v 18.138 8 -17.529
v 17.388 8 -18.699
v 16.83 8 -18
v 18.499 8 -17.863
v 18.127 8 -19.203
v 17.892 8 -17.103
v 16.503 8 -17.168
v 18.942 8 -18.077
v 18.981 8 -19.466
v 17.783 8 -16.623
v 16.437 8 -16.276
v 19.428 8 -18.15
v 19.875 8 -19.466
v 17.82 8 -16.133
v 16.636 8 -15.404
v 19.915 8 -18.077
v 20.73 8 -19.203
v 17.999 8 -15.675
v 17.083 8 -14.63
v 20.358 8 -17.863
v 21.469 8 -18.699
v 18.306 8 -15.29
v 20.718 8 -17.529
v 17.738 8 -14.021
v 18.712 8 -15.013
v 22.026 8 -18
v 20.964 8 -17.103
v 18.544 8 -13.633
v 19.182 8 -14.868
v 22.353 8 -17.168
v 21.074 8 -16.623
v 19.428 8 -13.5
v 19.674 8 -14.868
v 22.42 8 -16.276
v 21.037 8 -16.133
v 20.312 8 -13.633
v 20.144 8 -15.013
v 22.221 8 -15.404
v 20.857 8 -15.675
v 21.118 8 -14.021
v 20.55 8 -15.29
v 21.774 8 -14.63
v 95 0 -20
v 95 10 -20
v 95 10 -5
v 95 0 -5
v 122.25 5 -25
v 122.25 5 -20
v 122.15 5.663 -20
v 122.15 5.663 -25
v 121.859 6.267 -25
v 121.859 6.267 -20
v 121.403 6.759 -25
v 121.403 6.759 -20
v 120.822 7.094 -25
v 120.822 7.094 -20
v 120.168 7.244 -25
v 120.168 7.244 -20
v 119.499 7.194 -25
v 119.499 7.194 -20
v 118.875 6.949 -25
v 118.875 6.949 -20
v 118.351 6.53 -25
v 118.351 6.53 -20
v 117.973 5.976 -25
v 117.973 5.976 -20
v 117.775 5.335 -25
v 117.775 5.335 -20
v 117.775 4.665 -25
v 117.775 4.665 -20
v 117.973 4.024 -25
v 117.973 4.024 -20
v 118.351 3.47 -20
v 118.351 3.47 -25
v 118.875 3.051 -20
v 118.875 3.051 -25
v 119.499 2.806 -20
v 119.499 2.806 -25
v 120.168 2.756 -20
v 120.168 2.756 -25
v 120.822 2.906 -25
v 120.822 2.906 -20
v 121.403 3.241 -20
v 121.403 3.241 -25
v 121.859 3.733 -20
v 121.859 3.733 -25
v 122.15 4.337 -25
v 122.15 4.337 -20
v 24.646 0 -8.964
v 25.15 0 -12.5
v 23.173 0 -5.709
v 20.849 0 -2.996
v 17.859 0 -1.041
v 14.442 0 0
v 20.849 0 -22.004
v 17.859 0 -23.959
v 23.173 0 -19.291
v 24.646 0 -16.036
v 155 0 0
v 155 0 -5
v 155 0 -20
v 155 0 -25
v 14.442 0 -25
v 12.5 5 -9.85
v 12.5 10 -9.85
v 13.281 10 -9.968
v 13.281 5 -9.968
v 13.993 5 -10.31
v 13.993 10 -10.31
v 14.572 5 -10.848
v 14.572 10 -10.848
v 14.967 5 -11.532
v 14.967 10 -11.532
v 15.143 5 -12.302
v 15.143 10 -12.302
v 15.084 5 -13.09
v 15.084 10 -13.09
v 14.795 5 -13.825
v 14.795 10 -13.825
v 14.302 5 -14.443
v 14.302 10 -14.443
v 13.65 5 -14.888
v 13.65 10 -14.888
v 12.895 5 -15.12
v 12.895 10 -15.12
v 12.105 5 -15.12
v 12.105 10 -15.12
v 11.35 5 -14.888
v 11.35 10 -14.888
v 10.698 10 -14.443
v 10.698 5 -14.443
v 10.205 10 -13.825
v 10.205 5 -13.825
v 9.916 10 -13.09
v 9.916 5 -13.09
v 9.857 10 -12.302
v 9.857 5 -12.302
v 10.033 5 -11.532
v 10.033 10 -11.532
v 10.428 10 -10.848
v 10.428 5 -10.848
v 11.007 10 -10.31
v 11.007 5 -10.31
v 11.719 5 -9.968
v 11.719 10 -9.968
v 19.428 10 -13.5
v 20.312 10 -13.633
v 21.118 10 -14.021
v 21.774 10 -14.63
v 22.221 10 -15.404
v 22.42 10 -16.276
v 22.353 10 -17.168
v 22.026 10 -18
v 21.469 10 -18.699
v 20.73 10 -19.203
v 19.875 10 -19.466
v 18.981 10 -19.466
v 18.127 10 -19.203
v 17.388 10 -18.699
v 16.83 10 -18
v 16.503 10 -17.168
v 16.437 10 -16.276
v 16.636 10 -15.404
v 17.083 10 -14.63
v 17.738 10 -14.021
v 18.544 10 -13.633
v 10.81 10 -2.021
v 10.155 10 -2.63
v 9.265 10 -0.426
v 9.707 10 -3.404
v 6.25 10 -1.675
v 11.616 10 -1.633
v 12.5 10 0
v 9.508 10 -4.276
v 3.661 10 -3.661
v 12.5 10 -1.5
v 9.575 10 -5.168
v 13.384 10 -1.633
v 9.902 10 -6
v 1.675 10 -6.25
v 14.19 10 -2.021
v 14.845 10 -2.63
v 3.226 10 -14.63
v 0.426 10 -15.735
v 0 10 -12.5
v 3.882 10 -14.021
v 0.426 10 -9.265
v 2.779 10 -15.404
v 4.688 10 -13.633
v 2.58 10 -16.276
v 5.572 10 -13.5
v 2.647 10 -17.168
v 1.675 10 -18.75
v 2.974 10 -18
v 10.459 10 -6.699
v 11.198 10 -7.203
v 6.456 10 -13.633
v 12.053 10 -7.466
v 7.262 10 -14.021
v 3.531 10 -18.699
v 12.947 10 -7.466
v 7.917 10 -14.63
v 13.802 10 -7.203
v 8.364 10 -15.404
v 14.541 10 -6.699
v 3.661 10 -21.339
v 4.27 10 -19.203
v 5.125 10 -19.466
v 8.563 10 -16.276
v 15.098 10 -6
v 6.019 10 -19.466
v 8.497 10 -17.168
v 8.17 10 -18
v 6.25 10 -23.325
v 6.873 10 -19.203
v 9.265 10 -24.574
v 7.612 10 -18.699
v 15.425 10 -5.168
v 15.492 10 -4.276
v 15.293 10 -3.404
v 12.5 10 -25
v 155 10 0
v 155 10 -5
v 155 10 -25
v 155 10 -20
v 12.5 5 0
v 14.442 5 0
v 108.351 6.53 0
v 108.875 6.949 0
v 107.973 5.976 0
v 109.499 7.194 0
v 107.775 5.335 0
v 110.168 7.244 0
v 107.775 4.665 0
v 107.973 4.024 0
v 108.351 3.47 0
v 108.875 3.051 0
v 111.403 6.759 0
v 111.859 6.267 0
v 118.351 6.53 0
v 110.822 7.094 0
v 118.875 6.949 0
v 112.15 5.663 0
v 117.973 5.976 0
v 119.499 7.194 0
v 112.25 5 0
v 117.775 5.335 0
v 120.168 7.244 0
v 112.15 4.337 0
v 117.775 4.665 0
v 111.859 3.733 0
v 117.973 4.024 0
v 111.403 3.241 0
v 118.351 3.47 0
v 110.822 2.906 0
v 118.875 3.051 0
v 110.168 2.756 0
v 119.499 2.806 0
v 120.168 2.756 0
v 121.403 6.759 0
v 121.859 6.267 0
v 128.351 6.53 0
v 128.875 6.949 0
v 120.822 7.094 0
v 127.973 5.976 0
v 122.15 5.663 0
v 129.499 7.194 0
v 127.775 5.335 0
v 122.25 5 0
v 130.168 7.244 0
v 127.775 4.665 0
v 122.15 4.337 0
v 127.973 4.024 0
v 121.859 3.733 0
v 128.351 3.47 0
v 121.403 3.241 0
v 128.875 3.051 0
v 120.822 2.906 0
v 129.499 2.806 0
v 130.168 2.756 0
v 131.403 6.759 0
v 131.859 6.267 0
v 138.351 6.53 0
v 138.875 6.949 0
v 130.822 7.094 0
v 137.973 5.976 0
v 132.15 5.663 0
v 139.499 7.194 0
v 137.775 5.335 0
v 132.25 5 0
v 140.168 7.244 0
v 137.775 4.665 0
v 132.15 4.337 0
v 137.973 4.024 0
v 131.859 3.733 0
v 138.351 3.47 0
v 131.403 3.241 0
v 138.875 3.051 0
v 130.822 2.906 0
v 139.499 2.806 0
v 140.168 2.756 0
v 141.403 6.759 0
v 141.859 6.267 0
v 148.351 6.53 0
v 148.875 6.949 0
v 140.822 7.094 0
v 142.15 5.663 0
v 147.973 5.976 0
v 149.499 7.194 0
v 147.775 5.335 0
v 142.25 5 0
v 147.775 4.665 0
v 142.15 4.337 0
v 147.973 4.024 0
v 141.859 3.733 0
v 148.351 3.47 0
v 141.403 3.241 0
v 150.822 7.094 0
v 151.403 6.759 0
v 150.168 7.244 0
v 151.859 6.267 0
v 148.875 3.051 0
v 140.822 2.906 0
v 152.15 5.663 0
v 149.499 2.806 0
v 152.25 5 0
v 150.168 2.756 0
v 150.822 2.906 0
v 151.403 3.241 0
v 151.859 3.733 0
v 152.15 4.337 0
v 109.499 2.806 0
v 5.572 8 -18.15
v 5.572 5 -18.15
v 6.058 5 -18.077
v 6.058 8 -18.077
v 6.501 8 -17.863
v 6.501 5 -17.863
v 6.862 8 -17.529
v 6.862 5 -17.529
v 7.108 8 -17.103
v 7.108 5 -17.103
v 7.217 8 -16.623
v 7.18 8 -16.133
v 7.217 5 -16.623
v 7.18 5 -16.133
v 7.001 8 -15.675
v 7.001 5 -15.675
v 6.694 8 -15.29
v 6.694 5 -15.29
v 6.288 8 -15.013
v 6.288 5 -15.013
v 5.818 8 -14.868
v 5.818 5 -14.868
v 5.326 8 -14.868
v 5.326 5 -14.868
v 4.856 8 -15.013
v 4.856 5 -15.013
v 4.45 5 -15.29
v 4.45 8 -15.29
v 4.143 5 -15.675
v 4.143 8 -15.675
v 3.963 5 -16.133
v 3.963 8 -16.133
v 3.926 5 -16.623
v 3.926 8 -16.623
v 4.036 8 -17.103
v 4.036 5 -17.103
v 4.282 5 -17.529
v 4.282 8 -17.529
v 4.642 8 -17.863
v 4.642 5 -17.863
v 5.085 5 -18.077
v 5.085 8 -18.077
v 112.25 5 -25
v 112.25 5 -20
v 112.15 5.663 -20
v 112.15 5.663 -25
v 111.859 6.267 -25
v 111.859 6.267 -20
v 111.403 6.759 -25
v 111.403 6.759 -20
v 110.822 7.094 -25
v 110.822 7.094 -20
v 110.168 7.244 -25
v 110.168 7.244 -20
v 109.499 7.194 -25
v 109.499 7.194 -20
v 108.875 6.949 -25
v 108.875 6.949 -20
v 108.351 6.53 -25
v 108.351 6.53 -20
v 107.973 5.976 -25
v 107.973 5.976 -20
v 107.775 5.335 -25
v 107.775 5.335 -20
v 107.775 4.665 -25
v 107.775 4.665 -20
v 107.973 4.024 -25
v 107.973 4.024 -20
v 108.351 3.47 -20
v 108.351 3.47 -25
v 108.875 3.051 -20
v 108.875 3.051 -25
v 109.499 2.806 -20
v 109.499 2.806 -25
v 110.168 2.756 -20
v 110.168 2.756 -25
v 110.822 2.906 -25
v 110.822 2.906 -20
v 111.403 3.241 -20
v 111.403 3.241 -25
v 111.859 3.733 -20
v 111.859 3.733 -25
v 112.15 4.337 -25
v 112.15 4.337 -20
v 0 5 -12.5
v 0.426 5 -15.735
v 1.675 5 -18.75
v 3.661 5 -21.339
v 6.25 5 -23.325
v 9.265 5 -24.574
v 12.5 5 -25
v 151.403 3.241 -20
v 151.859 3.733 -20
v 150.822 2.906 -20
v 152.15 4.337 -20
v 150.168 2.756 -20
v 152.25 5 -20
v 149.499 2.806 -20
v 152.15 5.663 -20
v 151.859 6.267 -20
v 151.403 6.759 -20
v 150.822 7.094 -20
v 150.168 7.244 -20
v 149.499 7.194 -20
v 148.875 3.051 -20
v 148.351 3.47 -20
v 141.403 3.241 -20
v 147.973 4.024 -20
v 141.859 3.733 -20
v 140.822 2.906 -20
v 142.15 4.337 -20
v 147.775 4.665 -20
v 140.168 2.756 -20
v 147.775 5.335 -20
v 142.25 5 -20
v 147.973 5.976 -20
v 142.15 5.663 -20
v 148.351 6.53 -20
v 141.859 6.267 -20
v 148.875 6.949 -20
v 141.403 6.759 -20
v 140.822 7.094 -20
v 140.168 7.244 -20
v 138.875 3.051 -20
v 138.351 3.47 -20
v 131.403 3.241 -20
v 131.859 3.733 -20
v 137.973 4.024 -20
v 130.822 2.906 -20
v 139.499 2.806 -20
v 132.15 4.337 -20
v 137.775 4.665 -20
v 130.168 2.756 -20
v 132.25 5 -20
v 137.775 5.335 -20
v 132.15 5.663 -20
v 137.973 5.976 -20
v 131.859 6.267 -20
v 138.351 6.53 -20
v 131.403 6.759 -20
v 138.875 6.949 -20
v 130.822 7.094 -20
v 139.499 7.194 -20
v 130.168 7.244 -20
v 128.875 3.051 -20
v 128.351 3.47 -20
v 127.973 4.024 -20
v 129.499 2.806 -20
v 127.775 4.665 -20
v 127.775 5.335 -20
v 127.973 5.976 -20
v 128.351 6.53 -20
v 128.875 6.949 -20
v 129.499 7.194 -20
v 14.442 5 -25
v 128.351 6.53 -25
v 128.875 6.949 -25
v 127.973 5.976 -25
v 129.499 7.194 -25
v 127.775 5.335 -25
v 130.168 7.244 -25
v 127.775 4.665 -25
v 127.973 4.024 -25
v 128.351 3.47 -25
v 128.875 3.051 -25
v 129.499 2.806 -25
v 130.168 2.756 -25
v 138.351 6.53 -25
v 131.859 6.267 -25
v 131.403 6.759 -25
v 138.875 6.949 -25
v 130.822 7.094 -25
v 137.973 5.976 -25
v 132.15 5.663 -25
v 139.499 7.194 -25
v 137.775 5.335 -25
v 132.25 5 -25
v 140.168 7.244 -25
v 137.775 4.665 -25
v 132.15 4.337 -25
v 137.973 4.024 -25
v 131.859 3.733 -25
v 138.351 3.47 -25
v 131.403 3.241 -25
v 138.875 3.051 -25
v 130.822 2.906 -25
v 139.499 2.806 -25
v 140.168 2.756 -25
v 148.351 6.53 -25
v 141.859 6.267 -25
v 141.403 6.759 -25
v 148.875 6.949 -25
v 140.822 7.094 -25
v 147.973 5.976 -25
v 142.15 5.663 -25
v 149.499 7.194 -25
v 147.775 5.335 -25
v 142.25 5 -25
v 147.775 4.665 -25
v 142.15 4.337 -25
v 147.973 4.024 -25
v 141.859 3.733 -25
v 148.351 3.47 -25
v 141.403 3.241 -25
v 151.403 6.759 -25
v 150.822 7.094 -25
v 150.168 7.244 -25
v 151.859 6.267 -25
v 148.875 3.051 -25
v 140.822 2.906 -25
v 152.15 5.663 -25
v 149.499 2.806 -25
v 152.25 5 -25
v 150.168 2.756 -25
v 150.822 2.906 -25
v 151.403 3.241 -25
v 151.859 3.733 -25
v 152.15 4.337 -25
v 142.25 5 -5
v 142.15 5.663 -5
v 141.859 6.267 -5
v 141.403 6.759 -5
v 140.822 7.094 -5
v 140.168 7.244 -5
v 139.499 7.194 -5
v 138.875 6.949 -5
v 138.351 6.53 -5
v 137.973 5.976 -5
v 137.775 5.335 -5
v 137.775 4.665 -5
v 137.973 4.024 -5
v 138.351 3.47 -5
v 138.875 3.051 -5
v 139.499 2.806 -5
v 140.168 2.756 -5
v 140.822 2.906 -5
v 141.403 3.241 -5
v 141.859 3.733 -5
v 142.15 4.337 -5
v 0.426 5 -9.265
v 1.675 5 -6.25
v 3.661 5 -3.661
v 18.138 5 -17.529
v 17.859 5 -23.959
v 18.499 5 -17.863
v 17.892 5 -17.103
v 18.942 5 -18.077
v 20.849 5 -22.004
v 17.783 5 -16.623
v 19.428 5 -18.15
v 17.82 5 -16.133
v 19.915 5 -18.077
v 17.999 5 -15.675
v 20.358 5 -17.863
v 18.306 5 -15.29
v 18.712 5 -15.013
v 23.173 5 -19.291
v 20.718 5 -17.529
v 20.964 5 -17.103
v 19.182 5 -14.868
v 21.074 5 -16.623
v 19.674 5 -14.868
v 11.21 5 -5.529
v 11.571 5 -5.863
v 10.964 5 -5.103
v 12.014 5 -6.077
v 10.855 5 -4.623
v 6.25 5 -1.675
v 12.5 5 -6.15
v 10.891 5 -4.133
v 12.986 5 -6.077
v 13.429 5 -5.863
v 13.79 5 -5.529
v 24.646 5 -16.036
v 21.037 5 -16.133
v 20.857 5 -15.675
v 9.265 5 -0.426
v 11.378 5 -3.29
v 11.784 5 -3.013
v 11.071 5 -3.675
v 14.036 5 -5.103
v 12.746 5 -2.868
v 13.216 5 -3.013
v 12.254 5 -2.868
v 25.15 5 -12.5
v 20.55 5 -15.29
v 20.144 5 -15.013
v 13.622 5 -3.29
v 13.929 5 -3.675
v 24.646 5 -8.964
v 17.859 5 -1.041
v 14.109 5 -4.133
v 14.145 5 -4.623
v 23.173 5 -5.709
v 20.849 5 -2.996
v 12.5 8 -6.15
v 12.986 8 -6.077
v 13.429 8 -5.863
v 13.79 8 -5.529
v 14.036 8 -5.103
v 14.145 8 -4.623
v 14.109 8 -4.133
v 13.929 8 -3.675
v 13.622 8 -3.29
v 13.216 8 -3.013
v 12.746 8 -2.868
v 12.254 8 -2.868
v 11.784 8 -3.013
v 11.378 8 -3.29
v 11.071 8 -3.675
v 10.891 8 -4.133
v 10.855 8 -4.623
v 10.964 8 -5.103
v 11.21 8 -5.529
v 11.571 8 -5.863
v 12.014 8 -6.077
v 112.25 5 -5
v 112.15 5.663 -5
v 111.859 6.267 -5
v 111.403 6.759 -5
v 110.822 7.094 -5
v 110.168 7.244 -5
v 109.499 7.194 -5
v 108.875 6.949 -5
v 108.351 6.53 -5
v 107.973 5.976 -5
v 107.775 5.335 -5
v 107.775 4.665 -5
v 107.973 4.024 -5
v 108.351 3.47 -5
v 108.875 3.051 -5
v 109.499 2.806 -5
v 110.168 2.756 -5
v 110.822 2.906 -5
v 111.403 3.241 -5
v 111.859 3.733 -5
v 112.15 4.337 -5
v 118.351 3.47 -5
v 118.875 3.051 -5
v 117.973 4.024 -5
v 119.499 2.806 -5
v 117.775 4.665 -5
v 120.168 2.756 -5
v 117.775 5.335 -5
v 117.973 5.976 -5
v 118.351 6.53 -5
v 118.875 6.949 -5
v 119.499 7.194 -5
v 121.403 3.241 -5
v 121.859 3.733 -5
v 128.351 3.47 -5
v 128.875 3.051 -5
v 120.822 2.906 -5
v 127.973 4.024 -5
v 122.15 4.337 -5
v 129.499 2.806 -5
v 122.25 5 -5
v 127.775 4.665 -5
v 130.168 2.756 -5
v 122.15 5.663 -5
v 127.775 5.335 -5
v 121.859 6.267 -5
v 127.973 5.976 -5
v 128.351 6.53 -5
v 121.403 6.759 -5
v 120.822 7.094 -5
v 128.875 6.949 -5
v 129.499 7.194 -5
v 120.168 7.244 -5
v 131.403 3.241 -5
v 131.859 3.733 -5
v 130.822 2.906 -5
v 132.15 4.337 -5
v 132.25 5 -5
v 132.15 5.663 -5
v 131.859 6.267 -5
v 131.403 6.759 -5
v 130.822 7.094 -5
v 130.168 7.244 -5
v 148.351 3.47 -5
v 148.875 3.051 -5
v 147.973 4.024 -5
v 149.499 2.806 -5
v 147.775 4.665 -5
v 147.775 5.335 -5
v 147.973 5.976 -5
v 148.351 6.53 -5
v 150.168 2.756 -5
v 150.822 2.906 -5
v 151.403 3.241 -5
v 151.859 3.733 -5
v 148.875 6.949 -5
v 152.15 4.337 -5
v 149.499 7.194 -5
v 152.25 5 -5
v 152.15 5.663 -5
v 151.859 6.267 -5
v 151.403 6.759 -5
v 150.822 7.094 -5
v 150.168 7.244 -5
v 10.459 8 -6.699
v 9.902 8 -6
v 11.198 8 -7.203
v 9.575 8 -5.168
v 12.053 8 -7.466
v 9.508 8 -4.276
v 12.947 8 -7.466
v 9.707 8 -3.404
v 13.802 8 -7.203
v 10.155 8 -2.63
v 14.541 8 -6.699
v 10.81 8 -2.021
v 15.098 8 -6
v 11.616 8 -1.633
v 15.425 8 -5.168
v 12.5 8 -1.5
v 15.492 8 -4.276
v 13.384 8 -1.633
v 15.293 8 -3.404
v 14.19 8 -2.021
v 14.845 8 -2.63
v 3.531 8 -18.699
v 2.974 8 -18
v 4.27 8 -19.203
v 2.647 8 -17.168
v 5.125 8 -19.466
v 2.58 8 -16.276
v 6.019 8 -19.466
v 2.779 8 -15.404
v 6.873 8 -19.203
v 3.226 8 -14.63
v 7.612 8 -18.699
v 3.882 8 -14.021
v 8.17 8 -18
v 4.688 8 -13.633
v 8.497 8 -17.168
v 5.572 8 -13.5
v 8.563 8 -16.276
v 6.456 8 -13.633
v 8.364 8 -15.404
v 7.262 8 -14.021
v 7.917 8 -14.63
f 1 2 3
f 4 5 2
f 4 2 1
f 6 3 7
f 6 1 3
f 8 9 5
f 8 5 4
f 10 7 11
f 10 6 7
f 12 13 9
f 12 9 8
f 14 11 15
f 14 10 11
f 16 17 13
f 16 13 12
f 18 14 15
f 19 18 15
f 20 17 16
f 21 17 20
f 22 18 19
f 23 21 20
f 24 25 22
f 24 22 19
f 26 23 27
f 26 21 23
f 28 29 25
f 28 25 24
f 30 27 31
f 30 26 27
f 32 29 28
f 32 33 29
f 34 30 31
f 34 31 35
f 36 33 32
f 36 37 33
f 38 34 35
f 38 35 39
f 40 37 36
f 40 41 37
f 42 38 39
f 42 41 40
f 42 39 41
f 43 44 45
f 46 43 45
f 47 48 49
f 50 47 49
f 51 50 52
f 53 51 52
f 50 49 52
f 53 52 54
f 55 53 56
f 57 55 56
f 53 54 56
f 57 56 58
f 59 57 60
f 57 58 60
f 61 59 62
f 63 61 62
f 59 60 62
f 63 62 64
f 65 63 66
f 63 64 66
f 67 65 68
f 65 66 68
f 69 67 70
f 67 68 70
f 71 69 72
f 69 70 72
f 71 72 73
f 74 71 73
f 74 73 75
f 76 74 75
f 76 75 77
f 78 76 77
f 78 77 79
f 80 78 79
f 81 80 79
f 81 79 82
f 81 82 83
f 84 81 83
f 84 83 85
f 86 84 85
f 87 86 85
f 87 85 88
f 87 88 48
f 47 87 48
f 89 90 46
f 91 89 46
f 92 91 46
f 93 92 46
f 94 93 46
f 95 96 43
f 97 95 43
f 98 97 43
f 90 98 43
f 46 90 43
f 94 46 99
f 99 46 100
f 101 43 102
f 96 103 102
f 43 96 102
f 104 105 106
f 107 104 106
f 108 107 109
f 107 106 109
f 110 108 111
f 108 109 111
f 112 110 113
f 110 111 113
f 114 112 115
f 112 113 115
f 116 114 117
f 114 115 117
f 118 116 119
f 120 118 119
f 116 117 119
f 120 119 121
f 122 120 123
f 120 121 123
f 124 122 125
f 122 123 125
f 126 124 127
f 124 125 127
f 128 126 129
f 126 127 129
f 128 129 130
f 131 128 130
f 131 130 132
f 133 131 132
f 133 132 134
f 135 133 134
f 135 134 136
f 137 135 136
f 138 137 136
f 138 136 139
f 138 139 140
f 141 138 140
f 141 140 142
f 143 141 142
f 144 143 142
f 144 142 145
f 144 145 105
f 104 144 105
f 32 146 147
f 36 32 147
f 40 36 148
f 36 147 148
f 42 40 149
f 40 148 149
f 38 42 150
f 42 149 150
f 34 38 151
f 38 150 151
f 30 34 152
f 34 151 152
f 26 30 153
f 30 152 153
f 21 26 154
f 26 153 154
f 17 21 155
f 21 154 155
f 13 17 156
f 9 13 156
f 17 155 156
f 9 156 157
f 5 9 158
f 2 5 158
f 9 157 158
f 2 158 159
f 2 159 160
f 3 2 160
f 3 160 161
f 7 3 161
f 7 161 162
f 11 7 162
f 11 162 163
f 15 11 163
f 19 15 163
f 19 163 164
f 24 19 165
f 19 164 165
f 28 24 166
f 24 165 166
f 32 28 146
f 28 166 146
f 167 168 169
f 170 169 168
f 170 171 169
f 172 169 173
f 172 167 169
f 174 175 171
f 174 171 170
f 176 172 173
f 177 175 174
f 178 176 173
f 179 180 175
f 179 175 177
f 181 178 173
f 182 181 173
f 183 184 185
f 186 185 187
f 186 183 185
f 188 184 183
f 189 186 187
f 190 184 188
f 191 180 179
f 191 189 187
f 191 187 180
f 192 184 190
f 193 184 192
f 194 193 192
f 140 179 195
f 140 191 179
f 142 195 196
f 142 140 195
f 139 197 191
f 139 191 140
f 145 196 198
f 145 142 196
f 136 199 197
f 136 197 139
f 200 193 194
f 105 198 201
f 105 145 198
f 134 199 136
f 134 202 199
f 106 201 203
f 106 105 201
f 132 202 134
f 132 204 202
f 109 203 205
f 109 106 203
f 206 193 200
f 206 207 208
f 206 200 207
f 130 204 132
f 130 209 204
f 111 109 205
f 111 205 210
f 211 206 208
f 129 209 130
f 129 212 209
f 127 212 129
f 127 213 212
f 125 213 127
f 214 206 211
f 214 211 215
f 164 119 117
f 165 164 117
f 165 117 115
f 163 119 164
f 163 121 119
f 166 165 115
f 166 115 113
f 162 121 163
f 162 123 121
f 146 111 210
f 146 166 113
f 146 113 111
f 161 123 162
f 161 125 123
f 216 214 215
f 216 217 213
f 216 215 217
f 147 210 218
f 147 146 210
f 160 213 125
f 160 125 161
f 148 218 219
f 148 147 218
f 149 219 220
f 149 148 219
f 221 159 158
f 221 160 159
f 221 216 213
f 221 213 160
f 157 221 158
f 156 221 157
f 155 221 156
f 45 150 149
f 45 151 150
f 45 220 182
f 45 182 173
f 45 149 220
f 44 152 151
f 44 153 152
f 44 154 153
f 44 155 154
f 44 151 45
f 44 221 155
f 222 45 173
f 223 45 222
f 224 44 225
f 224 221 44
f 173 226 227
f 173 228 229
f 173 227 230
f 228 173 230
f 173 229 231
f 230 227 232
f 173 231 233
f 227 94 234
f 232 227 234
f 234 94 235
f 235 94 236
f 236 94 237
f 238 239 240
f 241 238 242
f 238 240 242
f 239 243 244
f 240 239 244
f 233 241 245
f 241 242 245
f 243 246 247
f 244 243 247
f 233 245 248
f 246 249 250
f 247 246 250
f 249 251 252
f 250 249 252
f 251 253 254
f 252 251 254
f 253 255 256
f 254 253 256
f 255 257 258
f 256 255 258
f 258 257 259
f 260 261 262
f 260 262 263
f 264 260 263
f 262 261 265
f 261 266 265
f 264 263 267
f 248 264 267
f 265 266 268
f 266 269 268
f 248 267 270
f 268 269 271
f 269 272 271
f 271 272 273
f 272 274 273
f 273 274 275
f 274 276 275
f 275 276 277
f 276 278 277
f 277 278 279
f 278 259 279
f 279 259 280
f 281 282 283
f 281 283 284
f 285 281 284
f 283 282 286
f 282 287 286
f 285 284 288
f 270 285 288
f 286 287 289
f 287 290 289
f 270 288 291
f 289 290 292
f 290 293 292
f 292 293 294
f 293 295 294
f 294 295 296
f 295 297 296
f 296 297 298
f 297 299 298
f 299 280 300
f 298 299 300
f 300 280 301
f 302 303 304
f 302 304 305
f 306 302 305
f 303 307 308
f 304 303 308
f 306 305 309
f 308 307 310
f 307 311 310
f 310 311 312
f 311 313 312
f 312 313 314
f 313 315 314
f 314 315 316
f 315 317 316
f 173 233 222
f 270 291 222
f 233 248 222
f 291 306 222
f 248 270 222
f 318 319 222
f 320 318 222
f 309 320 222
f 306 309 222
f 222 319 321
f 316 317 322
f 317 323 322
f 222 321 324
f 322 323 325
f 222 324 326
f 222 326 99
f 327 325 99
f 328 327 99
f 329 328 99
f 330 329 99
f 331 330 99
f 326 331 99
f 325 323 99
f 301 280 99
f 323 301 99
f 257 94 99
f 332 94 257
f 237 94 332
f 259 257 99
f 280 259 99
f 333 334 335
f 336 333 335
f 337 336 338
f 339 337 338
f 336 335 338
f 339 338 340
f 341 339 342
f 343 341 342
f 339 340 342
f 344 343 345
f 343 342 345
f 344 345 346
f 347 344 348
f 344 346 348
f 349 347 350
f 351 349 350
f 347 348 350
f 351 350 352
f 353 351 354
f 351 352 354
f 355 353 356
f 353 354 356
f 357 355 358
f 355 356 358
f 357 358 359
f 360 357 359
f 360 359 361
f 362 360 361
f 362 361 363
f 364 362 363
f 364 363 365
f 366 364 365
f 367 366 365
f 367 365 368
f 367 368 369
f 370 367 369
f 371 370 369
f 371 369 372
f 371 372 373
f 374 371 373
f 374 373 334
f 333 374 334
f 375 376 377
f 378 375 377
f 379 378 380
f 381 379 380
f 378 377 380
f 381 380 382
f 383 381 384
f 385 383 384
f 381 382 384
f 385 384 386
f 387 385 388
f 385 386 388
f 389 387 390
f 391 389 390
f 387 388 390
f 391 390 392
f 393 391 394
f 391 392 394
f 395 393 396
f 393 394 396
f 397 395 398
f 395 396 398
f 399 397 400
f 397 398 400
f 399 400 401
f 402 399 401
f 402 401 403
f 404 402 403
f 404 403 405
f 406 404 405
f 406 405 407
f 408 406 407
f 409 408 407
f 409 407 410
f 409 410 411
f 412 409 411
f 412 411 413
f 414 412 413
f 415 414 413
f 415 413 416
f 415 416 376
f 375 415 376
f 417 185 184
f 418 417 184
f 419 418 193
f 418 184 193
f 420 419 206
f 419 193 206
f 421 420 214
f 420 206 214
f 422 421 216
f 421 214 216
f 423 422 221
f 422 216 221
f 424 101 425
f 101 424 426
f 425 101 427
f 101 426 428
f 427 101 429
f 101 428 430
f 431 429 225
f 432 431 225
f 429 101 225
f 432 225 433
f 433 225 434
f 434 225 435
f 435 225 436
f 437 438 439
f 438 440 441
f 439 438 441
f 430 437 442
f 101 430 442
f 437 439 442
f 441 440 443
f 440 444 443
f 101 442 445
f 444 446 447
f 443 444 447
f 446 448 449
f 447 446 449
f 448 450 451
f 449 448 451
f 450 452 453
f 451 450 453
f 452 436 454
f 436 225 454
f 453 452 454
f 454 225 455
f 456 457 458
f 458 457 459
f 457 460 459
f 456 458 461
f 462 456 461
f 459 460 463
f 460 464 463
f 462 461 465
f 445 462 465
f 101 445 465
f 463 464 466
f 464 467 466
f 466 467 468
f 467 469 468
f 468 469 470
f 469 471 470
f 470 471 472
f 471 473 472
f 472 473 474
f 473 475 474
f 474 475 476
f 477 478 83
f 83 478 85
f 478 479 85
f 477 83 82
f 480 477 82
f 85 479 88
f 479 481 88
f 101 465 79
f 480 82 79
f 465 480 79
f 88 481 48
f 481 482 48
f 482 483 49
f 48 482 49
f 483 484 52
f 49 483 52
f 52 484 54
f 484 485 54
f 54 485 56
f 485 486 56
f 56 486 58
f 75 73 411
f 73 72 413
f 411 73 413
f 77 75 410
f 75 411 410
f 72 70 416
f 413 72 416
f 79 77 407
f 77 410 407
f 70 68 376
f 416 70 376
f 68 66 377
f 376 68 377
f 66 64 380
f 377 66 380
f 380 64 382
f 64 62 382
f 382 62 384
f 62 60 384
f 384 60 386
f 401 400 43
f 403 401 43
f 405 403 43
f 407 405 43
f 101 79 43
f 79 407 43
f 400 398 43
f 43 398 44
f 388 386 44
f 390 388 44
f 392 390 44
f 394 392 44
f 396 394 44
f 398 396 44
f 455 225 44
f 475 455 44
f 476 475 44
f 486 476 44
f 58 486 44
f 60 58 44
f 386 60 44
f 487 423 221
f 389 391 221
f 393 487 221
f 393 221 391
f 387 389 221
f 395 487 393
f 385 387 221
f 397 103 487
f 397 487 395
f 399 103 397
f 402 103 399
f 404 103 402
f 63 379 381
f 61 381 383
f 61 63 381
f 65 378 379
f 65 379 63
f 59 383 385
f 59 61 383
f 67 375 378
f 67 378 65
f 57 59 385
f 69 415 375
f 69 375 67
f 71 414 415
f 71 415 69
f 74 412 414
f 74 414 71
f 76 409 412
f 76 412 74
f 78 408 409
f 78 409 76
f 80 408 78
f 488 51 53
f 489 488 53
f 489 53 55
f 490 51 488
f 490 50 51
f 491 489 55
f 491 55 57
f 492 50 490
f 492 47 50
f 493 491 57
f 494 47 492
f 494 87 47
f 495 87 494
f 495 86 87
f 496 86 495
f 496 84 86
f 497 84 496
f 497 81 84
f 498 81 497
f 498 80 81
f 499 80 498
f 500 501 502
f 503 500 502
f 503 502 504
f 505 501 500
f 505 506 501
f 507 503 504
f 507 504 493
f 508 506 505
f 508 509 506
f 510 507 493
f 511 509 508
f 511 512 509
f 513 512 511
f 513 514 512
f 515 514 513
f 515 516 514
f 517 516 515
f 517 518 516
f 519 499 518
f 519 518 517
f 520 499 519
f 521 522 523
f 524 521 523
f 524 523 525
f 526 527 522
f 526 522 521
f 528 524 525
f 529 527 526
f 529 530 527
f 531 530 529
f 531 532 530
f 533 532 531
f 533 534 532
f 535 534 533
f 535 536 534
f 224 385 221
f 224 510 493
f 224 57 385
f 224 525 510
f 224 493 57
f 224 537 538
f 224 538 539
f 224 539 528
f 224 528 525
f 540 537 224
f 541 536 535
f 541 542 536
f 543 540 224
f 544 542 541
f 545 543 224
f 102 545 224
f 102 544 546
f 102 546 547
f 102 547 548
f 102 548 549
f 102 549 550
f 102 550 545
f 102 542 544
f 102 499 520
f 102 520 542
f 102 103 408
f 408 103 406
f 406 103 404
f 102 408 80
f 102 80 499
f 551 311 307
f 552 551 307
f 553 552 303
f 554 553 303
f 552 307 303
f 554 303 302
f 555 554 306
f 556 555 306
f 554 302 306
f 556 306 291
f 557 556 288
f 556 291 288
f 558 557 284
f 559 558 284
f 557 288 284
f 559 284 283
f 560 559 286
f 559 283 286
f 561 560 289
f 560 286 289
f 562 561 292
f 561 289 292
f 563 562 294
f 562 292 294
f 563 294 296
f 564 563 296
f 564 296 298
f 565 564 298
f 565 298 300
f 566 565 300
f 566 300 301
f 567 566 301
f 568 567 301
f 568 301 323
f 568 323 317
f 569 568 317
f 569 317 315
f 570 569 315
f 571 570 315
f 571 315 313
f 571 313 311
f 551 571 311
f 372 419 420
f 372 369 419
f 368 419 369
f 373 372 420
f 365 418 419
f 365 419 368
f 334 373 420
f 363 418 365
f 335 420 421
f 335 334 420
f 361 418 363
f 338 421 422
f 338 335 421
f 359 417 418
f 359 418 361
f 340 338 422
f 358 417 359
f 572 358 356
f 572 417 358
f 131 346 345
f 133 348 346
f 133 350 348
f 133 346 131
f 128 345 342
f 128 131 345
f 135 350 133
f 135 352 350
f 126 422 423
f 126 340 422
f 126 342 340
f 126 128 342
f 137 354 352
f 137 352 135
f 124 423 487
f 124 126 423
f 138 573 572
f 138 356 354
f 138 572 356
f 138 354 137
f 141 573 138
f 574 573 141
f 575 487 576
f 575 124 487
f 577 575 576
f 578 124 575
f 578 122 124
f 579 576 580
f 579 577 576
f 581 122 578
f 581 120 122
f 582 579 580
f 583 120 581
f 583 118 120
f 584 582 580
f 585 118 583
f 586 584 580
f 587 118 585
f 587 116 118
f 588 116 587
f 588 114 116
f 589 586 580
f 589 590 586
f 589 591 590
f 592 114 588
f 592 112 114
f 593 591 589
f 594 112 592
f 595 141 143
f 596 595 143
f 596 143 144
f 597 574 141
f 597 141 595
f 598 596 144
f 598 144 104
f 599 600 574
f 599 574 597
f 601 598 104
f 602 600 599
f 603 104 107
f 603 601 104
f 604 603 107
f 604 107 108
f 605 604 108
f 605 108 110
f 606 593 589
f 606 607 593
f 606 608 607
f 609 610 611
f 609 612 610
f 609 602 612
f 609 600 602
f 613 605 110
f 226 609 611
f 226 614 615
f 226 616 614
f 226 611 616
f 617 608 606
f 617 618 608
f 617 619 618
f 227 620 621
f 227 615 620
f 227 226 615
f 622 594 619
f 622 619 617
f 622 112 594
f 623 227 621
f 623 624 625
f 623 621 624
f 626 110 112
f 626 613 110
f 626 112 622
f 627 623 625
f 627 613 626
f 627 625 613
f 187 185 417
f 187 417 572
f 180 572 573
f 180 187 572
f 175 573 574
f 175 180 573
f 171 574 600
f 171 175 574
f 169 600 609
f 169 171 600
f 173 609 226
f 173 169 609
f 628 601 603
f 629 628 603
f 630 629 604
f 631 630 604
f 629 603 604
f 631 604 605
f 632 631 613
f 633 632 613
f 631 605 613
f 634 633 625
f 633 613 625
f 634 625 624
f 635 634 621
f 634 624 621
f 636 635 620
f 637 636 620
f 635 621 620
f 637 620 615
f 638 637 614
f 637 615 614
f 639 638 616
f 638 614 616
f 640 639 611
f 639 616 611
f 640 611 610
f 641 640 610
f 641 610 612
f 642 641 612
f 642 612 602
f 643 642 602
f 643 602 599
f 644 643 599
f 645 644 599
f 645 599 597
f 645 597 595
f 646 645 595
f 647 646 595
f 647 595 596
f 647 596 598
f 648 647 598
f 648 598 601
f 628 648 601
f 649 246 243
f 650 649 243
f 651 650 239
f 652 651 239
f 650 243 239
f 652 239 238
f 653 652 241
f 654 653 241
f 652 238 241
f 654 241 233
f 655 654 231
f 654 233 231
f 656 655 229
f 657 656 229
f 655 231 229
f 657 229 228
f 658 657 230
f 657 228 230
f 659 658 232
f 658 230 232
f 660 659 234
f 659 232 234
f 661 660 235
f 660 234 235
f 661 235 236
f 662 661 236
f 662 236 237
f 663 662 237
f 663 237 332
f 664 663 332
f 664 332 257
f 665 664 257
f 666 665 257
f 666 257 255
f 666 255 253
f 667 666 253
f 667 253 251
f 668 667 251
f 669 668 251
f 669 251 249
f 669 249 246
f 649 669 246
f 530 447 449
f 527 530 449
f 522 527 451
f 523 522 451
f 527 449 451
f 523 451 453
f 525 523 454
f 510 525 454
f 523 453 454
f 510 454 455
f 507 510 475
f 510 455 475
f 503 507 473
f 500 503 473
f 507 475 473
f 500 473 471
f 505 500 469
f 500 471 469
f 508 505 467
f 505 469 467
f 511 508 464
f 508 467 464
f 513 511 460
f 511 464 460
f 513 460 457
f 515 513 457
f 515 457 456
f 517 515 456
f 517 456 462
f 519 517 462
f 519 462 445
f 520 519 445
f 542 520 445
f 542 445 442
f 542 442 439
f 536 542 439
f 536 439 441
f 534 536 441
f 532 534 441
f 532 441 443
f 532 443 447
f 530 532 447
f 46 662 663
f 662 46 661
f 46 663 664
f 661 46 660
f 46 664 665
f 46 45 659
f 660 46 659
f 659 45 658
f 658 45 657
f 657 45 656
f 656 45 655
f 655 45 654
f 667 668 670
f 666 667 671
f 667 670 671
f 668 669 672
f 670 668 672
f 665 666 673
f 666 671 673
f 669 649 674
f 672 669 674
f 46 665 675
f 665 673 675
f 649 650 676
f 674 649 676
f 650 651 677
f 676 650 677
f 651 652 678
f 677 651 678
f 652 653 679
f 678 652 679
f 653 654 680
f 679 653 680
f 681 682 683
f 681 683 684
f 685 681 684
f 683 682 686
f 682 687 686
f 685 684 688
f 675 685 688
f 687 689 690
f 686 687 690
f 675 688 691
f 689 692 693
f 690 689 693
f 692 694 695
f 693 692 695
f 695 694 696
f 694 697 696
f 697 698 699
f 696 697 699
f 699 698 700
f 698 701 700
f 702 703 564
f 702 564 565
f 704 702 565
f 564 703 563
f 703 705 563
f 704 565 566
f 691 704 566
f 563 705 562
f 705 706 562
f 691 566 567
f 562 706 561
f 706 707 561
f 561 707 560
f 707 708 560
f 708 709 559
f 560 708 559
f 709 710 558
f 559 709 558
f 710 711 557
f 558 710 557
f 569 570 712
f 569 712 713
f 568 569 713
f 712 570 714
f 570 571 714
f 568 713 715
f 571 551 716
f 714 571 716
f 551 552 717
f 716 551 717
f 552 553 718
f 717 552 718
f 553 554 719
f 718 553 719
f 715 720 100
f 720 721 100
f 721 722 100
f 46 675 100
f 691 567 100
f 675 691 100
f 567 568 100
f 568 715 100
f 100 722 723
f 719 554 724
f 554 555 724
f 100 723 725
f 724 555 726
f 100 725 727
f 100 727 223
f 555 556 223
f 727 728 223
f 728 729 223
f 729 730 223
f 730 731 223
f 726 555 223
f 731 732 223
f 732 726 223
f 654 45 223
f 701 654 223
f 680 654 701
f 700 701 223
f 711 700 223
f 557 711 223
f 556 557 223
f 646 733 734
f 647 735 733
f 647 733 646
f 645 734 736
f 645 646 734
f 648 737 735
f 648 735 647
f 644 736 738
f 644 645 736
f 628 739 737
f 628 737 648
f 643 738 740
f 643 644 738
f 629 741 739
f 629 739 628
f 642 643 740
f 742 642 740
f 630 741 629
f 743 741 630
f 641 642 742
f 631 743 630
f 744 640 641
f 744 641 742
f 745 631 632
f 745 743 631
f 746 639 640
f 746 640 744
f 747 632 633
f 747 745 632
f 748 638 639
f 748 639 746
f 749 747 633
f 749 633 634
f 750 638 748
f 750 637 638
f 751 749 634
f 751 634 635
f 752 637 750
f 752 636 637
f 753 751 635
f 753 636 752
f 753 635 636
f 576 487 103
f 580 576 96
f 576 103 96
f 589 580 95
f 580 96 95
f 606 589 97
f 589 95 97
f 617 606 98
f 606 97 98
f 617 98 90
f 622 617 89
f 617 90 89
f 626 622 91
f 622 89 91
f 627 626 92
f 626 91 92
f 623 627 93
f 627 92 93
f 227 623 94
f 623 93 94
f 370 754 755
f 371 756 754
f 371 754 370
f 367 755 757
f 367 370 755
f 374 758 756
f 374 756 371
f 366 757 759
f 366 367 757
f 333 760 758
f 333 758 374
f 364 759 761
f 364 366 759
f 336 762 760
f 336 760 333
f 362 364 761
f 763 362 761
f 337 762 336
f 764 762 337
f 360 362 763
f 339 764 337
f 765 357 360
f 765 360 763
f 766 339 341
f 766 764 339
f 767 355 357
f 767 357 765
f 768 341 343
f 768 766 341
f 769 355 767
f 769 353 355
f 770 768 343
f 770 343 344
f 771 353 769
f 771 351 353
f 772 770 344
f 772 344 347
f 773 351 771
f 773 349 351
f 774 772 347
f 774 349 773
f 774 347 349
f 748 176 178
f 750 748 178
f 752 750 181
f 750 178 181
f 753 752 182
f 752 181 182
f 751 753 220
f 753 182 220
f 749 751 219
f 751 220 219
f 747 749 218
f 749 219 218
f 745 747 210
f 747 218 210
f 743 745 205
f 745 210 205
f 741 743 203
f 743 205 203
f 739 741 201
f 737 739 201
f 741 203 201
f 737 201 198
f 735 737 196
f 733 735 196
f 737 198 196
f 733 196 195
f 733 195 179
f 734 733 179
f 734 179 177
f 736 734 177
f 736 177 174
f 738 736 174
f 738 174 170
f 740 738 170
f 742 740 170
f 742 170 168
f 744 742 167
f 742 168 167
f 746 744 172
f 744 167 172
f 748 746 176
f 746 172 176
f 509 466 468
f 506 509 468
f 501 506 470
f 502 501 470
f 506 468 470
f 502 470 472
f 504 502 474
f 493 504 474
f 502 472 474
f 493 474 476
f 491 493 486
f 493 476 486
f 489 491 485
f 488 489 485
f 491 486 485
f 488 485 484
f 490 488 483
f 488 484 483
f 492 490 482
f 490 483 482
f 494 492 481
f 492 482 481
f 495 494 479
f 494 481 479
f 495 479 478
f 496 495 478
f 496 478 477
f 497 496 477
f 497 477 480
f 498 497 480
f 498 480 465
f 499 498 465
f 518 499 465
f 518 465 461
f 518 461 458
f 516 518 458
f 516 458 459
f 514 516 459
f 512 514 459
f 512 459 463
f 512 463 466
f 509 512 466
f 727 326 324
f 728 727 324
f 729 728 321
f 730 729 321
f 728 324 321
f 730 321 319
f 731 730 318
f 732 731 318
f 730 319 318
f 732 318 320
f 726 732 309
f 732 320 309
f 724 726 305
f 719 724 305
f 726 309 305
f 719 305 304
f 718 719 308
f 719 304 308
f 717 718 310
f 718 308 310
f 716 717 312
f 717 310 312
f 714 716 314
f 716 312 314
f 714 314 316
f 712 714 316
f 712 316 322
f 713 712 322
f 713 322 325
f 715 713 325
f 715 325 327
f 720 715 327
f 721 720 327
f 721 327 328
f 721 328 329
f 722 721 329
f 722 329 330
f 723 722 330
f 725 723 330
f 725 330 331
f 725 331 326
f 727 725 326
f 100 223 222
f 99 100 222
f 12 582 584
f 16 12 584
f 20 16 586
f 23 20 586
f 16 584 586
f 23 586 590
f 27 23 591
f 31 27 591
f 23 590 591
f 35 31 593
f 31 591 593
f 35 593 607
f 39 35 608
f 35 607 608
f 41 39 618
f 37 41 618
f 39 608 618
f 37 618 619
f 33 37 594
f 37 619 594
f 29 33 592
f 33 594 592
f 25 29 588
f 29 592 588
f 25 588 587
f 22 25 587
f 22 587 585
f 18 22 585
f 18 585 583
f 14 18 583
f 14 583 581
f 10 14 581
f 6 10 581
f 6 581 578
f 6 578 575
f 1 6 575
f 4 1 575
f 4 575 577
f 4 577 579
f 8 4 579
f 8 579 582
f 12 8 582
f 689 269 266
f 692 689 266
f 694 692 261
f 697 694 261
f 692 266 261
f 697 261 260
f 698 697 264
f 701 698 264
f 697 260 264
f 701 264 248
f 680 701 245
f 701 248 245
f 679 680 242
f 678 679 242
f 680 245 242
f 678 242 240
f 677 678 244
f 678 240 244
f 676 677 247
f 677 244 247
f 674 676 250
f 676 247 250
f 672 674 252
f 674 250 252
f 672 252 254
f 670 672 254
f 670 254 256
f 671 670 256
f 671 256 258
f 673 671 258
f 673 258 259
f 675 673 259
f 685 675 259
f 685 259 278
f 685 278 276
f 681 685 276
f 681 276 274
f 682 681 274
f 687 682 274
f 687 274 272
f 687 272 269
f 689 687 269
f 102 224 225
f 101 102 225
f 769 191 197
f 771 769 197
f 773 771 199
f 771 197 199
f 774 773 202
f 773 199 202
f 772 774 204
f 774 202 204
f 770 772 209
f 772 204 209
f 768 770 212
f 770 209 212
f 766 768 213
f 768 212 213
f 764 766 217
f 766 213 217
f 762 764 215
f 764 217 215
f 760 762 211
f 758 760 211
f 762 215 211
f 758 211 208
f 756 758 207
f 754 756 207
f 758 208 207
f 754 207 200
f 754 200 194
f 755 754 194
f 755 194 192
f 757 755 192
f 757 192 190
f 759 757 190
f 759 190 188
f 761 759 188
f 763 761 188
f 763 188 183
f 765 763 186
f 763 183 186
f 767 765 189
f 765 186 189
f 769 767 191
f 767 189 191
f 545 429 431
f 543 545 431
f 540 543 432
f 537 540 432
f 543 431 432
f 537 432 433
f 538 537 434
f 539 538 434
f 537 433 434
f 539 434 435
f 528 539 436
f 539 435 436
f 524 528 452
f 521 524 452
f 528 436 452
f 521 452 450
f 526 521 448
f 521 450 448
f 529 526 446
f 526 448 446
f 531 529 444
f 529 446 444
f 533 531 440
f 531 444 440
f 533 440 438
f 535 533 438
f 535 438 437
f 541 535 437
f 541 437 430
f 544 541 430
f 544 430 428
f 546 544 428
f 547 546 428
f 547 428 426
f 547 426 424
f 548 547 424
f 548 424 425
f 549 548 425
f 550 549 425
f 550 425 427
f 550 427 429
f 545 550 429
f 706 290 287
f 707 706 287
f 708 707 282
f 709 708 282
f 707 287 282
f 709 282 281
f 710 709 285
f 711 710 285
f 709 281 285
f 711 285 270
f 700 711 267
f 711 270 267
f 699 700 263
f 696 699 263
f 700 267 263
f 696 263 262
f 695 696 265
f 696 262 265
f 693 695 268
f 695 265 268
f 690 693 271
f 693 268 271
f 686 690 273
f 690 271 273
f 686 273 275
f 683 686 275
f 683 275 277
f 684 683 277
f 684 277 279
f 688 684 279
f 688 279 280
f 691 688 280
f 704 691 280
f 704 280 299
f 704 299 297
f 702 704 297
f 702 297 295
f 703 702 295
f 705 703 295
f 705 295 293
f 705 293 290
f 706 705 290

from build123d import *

# Parameters (mm, degrees)
SKETCH1_W           = 250
SKETCH1_H           = 25
BOSS_EXTRUDE1_DEPTH = 10
CUT_EXTRUDE1_REACH  = 253.446
SKETCH2_R           = 2.65
FILLET1_R           = 12.5
SKETCH3_R           = 2.25
CUT_EXTRUDE2_DEPTH  = 252.445819214
CUT_EXTRUDE5_REACH  = 253.446
SKETCH5_W           = 7.3
SKETCH5_H           = 4
SKETCH6_R           = 12.65
CUT_EXTRUDE6_DEPTH  = 5
CUT_EXTRUDE7_REACH  = 253.297
SKETCH7_R           = 1.65
SKETCH9_R           = 3
CUT_EXTRUDE9_DEPTH  = 2
CUT_EXTRUDE10_DEPTH = 252.445819214
SKETCH11_R          = 2.25
CUT_EXTRUDE11_DEPTH = 158.321327226


with BuildPart() as part:
    # Sketch1 → Boss-Extrude1 (new body)
    with BuildSketch(Plane(origin=(0, 0, 0), x_dir=(1, 0, 0), z_dir=(0, 1, 0))):
        with Locations((125, 12.5)):
            Rectangle(SKETCH1_W, SKETCH1_H)
    extrude(amount=BOSS_EXTRUDE1_DEPTH)

    # Sketch2 → Cut-Extrude1 (cut, up to next)
    with BuildSketch(Plane(origin=(0, 10, 0), x_dir=(1, 0, 0), z_dir=(0, 1, 0)), mode=Mode.PRIVATE) as cut_extrude1_sk1:
        with Locations(Location((12.5, 12.5, 0), (0, 0, 270))):
            Circle(SKETCH2_R)
    cut_extrude1_tool1 = extrude(cut_extrude1_sk1.sketch, amount=-CUT_EXTRUDE1_REACH, mode=Mode.PRIVATE) & part.part
    add(cut_extrude1_tool1.solids().sort_by_distance((12.5, 10, -12.5))[0], mode=Mode.SUBTRACT)

    # Fillet1
    fillet1_edges = [part.edges().sort_by_distance(p)[0] for p in [
        (0, 5, 0),
        (0, 5, -25),
    ]]
    fillet(fillet1_edges, radius=FILLET1_R - 0.0001)  # a hair under: the kernel refuses the full size

    # Sketch3 → Cut-Extrude2 (cut, through all)
    with BuildSketch(Plane(origin=(0, 0, -25), x_dir=(-1, 0, 0), z_dir=(0, 0, -1))):
        with Locations((-244.5, 5)):
            Circle(SKETCH3_R)
        with Locations((-230.5, 5)):
            Circle(SKETCH3_R)
    extrude(amount=-CUT_EXTRUDE2_DEPTH, mode=Mode.SUBTRACT)

    # Sketch5 → Cut-Extrude5 (cut, up to next)
    with BuildSketch(Plane(origin=(0, 10, 0), x_dir=(1, 0, 0), z_dir=(0, 1, 0)), mode=Mode.PRIVATE) as cut_extrude5_sk1:
        with Locations((244.5, 19)):
            Rectangle(SKETCH5_W, SKETCH5_H)
    cut_extrude5_tool1 = extrude(cut_extrude5_sk1.sketch, amount=-CUT_EXTRUDE5_REACH, mode=Mode.PRIVATE) & part.part
    # Sketch5 → Cut-Extrude5 (cut, up to next)
    with BuildSketch(Plane(origin=(0, 10, 0), x_dir=(1, 0, 0), z_dir=(0, 1, 0)), mode=Mode.PRIVATE) as cut_extrude5_sk2:
        with Locations((244.5, 6)):
            Rectangle(SKETCH5_W, SKETCH5_H)
    cut_extrude5_tool2 = extrude(cut_extrude5_sk2.sketch, amount=-CUT_EXTRUDE5_REACH, mode=Mode.PRIVATE) & part.part
    # Sketch5 → Cut-Extrude5 (cut, up to next)
    with BuildSketch(Plane(origin=(0, 10, 0), x_dir=(1, 0, 0), z_dir=(0, 1, 0)), mode=Mode.PRIVATE) as cut_extrude5_sk3:
        with Locations((230.5, 19)):
            Rectangle(SKETCH5_W, SKETCH5_H)
    cut_extrude5_tool3 = extrude(cut_extrude5_sk3.sketch, amount=-CUT_EXTRUDE5_REACH, mode=Mode.PRIVATE) & part.part
    # Sketch5 → Cut-Extrude5 (cut, up to next)
    with BuildSketch(Plane(origin=(0, 10, 0), x_dir=(1, 0, 0), z_dir=(0, 1, 0)), mode=Mode.PRIVATE) as cut_extrude5_sk4:
        with Locations((230.5, 6)):
            Rectangle(SKETCH5_W, SKETCH5_H)
    cut_extrude5_tool4 = extrude(cut_extrude5_sk4.sketch, amount=-CUT_EXTRUDE5_REACH, mode=Mode.PRIVATE) & part.part
    add(cut_extrude5_tool1.solids().sort_by_distance((244.5, 10, -19))[0], mode=Mode.SUBTRACT)
    add(cut_extrude5_tool2.solids().sort_by_distance((244.5, 10, -6))[0], mode=Mode.SUBTRACT)
    add(cut_extrude5_tool3.solids().sort_by_distance((230.5, 10, -19))[0], mode=Mode.SUBTRACT)
    add(cut_extrude5_tool4.solids().sort_by_distance((230.5, 10, -6))[0], mode=Mode.SUBTRACT)

    # Sketch6 → Cut-Extrude6 (cut)
    with BuildSketch(Plane.XZ):
        with Locations((12.5, -12.5)):
            Circle(SKETCH6_R)
    extrude(amount=-CUT_EXTRUDE6_DEPTH, mode=Mode.SUBTRACT)

    # Sketch7 → Cut-Extrude7 (cut, up to next)
    with BuildSketch(Plane.XZ.offset(-5), mode=Mode.PRIVATE) as cut_extrude7_sk1:
        with Locations(Location((12.5, -4.5, 0), (0, 0, 270))):
            Circle(SKETCH7_R)
    cut_extrude7_tool1 = extrude(cut_extrude7_sk1.sketch, amount=-CUT_EXTRUDE7_REACH, mode=Mode.PRIVATE) & part.part
    # Sketch7 → Cut-Extrude7 (cut, up to next)
    with BuildSketch(Plane.XZ.offset(-5), mode=Mode.PRIVATE) as cut_extrude7_sk2:
        with Locations(Location((19.42820323, -16.5, 0), (0, 0, 270))):
            Circle(SKETCH7_R)
    cut_extrude7_tool2 = extrude(cut_extrude7_sk2.sketch, amount=-CUT_EXTRUDE7_REACH, mode=Mode.PRIVATE) & part.part
    # Sketch7 → Cut-Extrude7 (cut, up to next)
    with BuildSketch(Plane.XZ.offset(-5), mode=Mode.PRIVATE) as cut_extrude7_sk3:
        with Locations(Location((5.57179677, -16.5, 0), (0, 0, 270))):
            Circle(SKETCH7_R)
    cut_extrude7_tool3 = extrude(cut_extrude7_sk3.sketch, amount=-CUT_EXTRUDE7_REACH, mode=Mode.PRIVATE) & part.part
    add(cut_extrude7_tool1.solids().sort_by_distance((12.5, 5, -4.5))[0], mode=Mode.SUBTRACT)
    add(cut_extrude7_tool2.solids().sort_by_distance((19.428203, 5, -16.5))[0], mode=Mode.SUBTRACT)
    add(cut_extrude7_tool3.solids().sort_by_distance((5.571797, 5, -16.5))[0], mode=Mode.SUBTRACT)

    # Sketch9 → Cut-Extrude9 (cut)
    with BuildSketch(Plane(origin=(0, 10, 0), x_dir=(1, 0, 0), z_dir=(0, 1, 0))):
        with Locations(Location((5.57179677, 16.5, 0), (0, 0, 270))):
            Circle(SKETCH9_R)
        with Locations(Location((12.5, 4.5, 0), (0, 0, 270))):
            Circle(SKETCH9_R)
        with Locations(Location((19.42820323, 16.5, 0), (0, 0, 270))):
            Circle(SKETCH9_R)
    extrude(amount=-CUT_EXTRUDE9_DEPTH, mode=Mode.SUBTRACT)

    # Sketch10 → Cut-Extrude10 (cut, through all)
    with BuildSketch(Plane(origin=(0, 10, 0), x_dir=(1, 0, 0), z_dir=(0, 1, 0))):
        Polygon((95, 5), (155, 5), (155, 0), (250, 0), (250, 25), (155, 25), (155, 20), (95, 20), align=None)
    extrude(amount=-CUT_EXTRUDE10_DEPTH, mode=Mode.SUBTRACT)

    # Sketch11 → Cut-Extrude11 (cut, through all)
    with BuildSketch(Plane.XY):
        with Locations((150, 5)):
            Circle(SKETCH11_R)
        with Locations((140, 5)):
            Circle(SKETCH11_R)
        with Locations((130, 5)):
            Circle(SKETCH11_R)
        with Locations((120, 5)):
            Circle(SKETCH11_R)
        with Locations((110, 5)):
            Circle(SKETCH11_R)
    extrude(amount=-CUT_EXTRUDE11_DEPTH, mode=Mode.SUBTRACT)


solid = part.part
